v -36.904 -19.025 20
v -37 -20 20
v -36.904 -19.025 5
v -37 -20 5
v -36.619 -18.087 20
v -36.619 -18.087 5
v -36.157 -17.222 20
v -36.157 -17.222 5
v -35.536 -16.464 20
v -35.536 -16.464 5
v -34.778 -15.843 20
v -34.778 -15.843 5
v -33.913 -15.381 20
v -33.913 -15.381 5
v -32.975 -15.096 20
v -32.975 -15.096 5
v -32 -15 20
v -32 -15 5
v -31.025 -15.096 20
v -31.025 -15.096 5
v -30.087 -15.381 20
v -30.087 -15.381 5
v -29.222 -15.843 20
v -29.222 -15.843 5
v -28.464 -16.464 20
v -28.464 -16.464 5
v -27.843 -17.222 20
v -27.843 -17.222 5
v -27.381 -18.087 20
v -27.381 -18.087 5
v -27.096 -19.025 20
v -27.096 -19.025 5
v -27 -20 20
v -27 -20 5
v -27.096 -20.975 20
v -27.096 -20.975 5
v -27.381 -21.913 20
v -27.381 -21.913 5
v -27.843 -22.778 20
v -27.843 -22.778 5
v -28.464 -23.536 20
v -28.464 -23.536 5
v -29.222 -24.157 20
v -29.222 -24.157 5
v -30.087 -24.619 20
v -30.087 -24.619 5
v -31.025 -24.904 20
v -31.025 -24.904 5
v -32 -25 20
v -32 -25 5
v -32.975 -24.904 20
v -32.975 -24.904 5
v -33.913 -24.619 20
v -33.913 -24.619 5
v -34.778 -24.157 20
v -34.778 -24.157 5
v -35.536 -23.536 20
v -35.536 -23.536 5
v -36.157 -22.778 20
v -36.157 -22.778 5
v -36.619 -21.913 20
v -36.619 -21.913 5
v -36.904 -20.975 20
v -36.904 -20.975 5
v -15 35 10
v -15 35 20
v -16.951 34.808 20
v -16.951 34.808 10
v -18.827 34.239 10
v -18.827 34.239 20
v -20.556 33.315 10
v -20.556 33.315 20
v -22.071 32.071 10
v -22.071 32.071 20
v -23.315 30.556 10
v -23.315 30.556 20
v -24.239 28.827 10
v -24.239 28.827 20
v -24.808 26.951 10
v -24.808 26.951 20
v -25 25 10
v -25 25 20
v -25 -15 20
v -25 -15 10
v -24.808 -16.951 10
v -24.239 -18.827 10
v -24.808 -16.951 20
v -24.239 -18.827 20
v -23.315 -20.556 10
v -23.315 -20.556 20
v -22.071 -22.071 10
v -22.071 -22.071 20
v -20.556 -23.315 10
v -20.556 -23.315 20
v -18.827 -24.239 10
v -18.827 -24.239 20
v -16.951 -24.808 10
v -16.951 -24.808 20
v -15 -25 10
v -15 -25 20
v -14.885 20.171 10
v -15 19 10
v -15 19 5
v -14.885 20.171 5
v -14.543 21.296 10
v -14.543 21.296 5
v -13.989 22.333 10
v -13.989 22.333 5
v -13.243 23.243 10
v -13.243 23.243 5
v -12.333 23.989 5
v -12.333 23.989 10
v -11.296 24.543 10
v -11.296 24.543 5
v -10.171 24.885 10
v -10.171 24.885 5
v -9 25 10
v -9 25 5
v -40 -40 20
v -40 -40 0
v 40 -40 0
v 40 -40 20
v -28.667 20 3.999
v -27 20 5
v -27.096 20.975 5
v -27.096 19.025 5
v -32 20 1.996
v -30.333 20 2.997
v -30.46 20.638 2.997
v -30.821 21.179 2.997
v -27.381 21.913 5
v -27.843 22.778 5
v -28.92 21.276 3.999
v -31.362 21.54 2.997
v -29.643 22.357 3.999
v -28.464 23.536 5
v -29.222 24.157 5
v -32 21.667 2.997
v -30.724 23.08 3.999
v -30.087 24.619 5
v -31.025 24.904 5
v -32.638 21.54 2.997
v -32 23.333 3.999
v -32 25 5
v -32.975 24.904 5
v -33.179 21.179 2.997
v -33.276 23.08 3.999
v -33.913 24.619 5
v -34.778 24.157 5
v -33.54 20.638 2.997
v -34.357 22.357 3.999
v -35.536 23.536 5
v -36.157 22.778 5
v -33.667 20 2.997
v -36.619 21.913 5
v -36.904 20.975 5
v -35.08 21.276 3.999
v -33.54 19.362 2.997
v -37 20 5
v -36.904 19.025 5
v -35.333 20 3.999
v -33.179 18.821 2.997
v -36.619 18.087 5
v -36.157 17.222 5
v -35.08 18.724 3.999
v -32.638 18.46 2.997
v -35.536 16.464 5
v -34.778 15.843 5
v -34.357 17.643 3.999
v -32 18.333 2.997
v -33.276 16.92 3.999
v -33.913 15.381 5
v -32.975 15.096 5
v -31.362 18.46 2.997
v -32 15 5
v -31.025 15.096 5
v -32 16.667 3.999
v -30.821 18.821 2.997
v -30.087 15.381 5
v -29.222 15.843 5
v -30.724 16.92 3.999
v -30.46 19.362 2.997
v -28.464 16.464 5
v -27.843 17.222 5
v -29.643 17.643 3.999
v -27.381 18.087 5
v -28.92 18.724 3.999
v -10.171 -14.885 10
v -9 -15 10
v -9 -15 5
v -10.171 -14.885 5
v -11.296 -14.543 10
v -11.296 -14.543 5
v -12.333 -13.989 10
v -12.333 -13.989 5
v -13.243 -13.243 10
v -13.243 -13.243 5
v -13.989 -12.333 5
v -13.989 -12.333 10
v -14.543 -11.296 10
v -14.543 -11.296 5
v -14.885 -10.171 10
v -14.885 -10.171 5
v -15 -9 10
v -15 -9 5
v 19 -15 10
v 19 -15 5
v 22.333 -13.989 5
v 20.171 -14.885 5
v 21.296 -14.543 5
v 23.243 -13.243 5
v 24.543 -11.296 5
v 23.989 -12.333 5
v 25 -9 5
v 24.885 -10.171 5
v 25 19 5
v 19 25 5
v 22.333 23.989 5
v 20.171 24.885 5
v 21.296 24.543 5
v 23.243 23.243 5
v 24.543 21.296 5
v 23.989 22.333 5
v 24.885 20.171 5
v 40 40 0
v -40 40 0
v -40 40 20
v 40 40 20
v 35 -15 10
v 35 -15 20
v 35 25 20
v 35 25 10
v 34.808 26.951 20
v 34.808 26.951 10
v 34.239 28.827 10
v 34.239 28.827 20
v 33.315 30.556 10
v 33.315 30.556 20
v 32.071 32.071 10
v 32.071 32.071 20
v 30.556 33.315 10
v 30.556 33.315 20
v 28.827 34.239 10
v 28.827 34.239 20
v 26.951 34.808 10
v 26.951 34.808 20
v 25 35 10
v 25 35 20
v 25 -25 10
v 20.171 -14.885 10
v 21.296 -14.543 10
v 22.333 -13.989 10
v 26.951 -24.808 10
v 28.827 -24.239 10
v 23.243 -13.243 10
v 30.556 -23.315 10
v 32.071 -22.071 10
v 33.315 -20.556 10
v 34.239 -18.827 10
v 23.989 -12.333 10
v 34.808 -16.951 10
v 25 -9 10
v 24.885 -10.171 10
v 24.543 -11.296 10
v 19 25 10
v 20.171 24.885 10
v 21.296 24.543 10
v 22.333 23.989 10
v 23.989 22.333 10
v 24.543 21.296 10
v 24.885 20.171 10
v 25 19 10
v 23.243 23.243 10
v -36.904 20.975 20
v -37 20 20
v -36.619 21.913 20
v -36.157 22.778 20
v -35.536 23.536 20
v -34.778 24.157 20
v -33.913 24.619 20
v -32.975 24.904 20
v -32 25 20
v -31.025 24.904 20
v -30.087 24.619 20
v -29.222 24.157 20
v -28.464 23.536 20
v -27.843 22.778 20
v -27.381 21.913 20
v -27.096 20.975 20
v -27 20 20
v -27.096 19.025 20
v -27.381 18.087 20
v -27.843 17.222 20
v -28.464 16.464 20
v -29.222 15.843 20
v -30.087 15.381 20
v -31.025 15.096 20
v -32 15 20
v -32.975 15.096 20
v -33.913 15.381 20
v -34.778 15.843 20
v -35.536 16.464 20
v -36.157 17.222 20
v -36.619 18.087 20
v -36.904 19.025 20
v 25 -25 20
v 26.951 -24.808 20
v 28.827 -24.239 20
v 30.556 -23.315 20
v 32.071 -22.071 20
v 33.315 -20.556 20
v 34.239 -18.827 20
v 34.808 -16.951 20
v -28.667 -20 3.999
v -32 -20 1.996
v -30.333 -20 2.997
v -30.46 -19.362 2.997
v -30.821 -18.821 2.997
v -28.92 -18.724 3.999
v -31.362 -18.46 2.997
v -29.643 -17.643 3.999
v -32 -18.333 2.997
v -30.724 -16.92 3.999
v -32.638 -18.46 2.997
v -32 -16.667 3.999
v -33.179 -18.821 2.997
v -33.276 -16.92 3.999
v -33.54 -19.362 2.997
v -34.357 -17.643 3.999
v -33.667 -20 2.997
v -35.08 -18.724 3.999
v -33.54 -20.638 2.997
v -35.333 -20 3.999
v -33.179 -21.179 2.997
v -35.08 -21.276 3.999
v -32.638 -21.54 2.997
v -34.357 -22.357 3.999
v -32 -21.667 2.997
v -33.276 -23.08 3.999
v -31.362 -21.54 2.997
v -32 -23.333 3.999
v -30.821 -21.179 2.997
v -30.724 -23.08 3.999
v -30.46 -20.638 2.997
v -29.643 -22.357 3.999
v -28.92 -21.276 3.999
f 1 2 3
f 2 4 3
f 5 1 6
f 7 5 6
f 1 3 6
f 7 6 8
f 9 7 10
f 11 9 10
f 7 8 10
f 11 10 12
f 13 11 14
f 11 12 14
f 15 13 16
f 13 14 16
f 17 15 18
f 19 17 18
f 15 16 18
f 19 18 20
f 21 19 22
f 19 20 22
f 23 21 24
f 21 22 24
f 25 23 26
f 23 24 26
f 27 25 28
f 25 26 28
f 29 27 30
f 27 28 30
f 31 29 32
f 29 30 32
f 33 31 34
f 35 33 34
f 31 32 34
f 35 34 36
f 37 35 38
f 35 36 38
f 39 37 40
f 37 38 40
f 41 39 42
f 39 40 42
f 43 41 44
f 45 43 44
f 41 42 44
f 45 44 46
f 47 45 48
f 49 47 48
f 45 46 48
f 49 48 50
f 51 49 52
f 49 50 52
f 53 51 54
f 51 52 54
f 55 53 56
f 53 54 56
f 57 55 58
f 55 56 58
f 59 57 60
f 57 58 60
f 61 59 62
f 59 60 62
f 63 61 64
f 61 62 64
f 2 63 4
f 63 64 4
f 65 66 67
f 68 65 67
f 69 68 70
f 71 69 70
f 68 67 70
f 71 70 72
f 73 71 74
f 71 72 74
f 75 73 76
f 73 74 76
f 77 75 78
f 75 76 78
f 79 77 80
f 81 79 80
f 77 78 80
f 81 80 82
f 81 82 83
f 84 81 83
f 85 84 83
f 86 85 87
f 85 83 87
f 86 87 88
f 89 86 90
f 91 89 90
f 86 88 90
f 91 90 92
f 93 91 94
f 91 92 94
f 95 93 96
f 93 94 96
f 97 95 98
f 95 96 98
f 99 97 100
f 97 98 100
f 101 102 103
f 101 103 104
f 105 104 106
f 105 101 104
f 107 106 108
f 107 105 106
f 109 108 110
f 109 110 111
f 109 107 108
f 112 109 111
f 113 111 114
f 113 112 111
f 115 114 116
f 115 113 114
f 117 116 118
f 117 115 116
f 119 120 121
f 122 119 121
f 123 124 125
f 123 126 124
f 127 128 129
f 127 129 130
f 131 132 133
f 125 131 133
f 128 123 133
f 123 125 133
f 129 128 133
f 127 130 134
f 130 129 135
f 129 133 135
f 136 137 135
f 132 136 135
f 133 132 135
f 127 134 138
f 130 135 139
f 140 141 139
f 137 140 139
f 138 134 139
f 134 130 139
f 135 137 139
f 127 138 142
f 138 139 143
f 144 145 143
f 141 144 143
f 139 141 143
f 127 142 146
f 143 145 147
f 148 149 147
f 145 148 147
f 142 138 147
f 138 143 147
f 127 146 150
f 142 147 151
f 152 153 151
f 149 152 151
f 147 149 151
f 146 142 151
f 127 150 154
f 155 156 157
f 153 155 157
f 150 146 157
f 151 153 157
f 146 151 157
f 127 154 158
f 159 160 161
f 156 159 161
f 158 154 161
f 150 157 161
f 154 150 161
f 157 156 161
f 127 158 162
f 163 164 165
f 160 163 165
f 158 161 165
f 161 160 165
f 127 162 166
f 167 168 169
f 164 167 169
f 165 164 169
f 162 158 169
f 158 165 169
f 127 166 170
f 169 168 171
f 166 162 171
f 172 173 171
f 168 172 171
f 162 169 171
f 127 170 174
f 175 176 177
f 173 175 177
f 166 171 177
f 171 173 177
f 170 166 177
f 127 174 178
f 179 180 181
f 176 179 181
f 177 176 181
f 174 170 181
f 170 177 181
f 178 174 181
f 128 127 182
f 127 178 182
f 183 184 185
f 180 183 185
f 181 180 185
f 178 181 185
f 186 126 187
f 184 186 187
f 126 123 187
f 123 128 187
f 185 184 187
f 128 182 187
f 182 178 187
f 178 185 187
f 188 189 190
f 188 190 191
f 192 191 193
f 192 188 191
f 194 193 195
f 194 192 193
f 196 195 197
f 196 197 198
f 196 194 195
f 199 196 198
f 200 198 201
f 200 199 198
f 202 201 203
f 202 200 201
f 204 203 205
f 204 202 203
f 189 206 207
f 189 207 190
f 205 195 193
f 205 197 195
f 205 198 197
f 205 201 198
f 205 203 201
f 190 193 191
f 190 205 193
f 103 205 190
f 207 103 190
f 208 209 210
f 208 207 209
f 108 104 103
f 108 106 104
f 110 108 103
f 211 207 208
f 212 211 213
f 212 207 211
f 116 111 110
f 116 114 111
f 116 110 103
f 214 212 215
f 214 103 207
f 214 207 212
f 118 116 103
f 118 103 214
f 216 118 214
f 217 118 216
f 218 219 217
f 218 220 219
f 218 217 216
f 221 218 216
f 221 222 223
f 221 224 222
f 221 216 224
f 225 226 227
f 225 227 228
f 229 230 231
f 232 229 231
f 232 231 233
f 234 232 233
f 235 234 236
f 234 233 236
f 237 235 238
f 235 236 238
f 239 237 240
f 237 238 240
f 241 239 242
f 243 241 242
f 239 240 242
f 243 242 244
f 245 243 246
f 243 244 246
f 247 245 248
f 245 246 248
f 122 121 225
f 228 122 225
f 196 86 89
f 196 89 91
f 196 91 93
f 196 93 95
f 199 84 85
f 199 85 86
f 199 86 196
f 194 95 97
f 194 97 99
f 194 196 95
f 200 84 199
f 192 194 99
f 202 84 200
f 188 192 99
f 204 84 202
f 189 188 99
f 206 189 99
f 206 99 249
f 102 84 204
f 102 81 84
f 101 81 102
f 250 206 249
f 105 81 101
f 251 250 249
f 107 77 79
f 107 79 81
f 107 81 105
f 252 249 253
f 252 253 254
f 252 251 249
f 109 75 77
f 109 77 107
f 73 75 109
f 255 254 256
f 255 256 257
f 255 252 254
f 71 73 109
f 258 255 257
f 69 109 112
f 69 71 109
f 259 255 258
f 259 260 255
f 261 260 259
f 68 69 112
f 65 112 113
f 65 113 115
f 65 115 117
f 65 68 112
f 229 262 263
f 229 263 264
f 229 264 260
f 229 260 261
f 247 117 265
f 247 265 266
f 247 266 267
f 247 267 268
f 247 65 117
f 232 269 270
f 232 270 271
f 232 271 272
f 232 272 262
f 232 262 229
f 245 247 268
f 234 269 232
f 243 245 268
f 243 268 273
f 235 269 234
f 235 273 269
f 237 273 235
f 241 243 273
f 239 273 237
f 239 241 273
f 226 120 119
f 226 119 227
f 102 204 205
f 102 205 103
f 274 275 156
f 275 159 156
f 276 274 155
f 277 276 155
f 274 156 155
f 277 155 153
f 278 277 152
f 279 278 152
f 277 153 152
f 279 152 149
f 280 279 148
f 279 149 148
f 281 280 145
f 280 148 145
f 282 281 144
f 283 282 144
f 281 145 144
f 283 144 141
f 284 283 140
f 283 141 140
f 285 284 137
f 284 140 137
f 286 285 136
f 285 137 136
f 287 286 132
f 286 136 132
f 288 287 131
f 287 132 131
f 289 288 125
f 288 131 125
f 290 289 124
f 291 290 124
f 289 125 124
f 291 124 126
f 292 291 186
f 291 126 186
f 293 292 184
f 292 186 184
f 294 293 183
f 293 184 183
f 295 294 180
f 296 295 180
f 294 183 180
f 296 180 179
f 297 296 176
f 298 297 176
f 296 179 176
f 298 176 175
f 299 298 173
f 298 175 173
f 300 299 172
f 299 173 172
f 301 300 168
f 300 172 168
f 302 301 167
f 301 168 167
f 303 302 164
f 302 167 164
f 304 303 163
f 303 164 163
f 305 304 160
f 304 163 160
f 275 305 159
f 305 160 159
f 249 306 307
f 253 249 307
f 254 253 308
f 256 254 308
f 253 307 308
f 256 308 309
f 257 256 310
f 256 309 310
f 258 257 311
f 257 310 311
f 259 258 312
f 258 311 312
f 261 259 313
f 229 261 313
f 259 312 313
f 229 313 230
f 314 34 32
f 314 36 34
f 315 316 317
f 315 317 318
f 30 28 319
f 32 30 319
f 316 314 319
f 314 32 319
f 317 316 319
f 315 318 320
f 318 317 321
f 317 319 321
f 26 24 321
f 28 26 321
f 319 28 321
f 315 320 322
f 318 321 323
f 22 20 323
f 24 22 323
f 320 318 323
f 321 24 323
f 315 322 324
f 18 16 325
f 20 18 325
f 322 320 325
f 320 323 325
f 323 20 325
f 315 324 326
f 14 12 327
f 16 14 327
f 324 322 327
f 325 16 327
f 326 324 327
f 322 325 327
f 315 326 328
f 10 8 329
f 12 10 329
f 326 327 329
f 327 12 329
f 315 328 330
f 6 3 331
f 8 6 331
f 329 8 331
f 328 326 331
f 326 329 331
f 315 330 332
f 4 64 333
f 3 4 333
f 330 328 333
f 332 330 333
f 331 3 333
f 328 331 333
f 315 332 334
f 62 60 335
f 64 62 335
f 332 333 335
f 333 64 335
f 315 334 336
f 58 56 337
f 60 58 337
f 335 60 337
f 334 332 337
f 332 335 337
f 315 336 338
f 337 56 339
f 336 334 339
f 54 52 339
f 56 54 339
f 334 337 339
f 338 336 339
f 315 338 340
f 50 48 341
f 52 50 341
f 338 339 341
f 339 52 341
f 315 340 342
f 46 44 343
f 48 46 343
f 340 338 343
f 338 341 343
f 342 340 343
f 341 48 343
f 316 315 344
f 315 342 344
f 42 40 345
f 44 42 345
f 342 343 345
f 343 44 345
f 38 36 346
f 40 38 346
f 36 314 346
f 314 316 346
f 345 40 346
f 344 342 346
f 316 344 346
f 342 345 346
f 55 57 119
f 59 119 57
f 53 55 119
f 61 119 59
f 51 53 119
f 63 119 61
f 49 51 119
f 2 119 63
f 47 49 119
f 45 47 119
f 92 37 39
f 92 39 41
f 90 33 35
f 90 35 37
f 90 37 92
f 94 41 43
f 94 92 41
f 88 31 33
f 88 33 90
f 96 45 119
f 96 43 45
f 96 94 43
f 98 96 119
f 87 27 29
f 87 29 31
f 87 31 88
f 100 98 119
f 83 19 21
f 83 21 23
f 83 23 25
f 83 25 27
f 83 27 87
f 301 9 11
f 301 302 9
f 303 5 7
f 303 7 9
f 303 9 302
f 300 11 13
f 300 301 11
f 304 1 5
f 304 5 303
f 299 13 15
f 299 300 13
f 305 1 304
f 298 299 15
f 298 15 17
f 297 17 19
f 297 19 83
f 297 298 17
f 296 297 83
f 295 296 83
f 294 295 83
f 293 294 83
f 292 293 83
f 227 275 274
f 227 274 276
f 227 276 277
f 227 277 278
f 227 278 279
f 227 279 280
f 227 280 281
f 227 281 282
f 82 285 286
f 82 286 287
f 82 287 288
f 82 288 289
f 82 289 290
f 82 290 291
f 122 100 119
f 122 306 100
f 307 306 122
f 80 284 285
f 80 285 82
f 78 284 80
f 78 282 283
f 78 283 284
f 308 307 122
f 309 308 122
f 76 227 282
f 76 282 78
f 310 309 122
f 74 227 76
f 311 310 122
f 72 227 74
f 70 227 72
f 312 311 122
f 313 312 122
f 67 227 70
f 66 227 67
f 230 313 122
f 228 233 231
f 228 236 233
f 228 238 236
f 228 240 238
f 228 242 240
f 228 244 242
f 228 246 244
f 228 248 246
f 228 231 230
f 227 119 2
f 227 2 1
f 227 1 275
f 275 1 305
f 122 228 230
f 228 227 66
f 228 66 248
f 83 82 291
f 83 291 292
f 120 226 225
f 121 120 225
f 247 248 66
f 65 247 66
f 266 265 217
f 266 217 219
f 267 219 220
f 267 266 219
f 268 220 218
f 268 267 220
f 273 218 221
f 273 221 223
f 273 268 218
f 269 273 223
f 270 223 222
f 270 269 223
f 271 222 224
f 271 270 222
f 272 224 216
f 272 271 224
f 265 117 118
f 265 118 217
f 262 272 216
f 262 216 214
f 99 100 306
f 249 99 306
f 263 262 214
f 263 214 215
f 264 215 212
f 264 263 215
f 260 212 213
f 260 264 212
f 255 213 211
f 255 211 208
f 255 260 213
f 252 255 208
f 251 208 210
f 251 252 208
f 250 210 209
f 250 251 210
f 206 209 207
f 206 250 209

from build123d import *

# Parameters (mm, degrees)
F0_W     = 80
F0_H     = 80
F1_DEPTH = 20
F3_D     = 10
F3_DEPTH = 15
F3_TIP   = 3.0043030951
F5_DEPTH = 10
F6_DEPTH = 15


with BuildPart() as f1:
    # F0 (on Top) → F1 (new body)
    with BuildSketch(Plane.XY):
        Rectangle(F0_W, F0_H)
    extrude(amount=F1_DEPTH)

    # F3
    with Locations(Plane.XY.offset(20)):
        with Locations((-32, 20), (-32, -20)):
            Hole(F3_D / 2, depth=F3_DEPTH)
            with Locations((0, 0, -(F3_DEPTH + F3_TIP / 2))):  # 118° drill point
                Cone(0, F3_D / 2, F3_TIP, mode=Mode.SUBTRACT)

    # F4 (on face) → F5 (cut)
    with BuildSketch(Plane.XY.offset(20)):
        with BuildLine():
            Line((25, 35), (-15, 35))
            ThreePointArc((-15, 35), (-22.0710678119, 32.0710678119), (-25, 25))
            Line((-25, 25), (-25, -15))
            ThreePointArc((-25, -15), (-22.0710678119, -22.0710678119), (-15, -25))
            Line((-15, -25), (25, -25))
            ThreePointArc((25, -25), (32.0710678119, -22.0710678119), (35, -15))
            Line((35, -15), (35, 25))
            ThreePointArc((35, 25), (32.0710678119, 32.0710678119), (25, 35))
        make_face()
        with BuildLine():
            ThreePointArc((-15, 19), (-13.2426406871, 23.2426406871), (-9, 25))
            Line((-9, 25), (19, 25))
            ThreePointArc((19, 25), (23.2426406871, 23.2426406871), (25, 19))
            Line((25, 19), (25, -9))
            ThreePointArc((25, -9), (23.2426406871, -13.2426406871), (19, -15))
            Line((19, -15), (-9, -15))
            ThreePointArc((-9, -15), (-13.2426406871, -13.2426406871), (-15, -9))
            Line((-15, -9), (-15, 19))
        make_face(mode=Mode.SUBTRACT)
    extrude(amount=-F5_DEPTH, mode=Mode.SUBTRACT)

    # F6 (cut): a face of the model
    f6_faces = [f1.faces().sort_by_distance(p)[0] for p in [
        (5, 5, 20),
    ]]
    extrude(f6_faces, amount=-F6_DEPTH, mode=Mode.SUBTRACT)


solid = f1.part
